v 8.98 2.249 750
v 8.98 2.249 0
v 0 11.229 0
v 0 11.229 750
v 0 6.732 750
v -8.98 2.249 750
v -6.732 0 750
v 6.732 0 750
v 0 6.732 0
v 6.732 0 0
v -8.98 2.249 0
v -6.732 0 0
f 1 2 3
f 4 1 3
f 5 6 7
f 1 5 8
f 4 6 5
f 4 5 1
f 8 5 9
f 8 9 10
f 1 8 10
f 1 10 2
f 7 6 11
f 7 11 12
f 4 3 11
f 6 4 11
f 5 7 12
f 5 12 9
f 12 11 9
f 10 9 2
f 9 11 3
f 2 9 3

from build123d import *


with BuildPart() as part:
    # Varredura1: sweep along a path in Esboço2
    with BuildLine(Plane(origin=(0, 0, 0), x_dir=(1, 0, 0), z_dir=(0, 1, 0))) as varredura1_path:
        Line((0, 0), (0, -750))
    # Esboço1 → Varredura1 (sweep)
    with BuildSketch(Plane.XY):
        Polygon((0, 11.228855685), (8.980256121, 2.248599564), (6.731656557, 0), (0, 6.731656557), (-6.731656557, 0), (-8.980256121, 2.248599564), align=None)
    sweep(path=varredura1_path.line)


solid = part.part
